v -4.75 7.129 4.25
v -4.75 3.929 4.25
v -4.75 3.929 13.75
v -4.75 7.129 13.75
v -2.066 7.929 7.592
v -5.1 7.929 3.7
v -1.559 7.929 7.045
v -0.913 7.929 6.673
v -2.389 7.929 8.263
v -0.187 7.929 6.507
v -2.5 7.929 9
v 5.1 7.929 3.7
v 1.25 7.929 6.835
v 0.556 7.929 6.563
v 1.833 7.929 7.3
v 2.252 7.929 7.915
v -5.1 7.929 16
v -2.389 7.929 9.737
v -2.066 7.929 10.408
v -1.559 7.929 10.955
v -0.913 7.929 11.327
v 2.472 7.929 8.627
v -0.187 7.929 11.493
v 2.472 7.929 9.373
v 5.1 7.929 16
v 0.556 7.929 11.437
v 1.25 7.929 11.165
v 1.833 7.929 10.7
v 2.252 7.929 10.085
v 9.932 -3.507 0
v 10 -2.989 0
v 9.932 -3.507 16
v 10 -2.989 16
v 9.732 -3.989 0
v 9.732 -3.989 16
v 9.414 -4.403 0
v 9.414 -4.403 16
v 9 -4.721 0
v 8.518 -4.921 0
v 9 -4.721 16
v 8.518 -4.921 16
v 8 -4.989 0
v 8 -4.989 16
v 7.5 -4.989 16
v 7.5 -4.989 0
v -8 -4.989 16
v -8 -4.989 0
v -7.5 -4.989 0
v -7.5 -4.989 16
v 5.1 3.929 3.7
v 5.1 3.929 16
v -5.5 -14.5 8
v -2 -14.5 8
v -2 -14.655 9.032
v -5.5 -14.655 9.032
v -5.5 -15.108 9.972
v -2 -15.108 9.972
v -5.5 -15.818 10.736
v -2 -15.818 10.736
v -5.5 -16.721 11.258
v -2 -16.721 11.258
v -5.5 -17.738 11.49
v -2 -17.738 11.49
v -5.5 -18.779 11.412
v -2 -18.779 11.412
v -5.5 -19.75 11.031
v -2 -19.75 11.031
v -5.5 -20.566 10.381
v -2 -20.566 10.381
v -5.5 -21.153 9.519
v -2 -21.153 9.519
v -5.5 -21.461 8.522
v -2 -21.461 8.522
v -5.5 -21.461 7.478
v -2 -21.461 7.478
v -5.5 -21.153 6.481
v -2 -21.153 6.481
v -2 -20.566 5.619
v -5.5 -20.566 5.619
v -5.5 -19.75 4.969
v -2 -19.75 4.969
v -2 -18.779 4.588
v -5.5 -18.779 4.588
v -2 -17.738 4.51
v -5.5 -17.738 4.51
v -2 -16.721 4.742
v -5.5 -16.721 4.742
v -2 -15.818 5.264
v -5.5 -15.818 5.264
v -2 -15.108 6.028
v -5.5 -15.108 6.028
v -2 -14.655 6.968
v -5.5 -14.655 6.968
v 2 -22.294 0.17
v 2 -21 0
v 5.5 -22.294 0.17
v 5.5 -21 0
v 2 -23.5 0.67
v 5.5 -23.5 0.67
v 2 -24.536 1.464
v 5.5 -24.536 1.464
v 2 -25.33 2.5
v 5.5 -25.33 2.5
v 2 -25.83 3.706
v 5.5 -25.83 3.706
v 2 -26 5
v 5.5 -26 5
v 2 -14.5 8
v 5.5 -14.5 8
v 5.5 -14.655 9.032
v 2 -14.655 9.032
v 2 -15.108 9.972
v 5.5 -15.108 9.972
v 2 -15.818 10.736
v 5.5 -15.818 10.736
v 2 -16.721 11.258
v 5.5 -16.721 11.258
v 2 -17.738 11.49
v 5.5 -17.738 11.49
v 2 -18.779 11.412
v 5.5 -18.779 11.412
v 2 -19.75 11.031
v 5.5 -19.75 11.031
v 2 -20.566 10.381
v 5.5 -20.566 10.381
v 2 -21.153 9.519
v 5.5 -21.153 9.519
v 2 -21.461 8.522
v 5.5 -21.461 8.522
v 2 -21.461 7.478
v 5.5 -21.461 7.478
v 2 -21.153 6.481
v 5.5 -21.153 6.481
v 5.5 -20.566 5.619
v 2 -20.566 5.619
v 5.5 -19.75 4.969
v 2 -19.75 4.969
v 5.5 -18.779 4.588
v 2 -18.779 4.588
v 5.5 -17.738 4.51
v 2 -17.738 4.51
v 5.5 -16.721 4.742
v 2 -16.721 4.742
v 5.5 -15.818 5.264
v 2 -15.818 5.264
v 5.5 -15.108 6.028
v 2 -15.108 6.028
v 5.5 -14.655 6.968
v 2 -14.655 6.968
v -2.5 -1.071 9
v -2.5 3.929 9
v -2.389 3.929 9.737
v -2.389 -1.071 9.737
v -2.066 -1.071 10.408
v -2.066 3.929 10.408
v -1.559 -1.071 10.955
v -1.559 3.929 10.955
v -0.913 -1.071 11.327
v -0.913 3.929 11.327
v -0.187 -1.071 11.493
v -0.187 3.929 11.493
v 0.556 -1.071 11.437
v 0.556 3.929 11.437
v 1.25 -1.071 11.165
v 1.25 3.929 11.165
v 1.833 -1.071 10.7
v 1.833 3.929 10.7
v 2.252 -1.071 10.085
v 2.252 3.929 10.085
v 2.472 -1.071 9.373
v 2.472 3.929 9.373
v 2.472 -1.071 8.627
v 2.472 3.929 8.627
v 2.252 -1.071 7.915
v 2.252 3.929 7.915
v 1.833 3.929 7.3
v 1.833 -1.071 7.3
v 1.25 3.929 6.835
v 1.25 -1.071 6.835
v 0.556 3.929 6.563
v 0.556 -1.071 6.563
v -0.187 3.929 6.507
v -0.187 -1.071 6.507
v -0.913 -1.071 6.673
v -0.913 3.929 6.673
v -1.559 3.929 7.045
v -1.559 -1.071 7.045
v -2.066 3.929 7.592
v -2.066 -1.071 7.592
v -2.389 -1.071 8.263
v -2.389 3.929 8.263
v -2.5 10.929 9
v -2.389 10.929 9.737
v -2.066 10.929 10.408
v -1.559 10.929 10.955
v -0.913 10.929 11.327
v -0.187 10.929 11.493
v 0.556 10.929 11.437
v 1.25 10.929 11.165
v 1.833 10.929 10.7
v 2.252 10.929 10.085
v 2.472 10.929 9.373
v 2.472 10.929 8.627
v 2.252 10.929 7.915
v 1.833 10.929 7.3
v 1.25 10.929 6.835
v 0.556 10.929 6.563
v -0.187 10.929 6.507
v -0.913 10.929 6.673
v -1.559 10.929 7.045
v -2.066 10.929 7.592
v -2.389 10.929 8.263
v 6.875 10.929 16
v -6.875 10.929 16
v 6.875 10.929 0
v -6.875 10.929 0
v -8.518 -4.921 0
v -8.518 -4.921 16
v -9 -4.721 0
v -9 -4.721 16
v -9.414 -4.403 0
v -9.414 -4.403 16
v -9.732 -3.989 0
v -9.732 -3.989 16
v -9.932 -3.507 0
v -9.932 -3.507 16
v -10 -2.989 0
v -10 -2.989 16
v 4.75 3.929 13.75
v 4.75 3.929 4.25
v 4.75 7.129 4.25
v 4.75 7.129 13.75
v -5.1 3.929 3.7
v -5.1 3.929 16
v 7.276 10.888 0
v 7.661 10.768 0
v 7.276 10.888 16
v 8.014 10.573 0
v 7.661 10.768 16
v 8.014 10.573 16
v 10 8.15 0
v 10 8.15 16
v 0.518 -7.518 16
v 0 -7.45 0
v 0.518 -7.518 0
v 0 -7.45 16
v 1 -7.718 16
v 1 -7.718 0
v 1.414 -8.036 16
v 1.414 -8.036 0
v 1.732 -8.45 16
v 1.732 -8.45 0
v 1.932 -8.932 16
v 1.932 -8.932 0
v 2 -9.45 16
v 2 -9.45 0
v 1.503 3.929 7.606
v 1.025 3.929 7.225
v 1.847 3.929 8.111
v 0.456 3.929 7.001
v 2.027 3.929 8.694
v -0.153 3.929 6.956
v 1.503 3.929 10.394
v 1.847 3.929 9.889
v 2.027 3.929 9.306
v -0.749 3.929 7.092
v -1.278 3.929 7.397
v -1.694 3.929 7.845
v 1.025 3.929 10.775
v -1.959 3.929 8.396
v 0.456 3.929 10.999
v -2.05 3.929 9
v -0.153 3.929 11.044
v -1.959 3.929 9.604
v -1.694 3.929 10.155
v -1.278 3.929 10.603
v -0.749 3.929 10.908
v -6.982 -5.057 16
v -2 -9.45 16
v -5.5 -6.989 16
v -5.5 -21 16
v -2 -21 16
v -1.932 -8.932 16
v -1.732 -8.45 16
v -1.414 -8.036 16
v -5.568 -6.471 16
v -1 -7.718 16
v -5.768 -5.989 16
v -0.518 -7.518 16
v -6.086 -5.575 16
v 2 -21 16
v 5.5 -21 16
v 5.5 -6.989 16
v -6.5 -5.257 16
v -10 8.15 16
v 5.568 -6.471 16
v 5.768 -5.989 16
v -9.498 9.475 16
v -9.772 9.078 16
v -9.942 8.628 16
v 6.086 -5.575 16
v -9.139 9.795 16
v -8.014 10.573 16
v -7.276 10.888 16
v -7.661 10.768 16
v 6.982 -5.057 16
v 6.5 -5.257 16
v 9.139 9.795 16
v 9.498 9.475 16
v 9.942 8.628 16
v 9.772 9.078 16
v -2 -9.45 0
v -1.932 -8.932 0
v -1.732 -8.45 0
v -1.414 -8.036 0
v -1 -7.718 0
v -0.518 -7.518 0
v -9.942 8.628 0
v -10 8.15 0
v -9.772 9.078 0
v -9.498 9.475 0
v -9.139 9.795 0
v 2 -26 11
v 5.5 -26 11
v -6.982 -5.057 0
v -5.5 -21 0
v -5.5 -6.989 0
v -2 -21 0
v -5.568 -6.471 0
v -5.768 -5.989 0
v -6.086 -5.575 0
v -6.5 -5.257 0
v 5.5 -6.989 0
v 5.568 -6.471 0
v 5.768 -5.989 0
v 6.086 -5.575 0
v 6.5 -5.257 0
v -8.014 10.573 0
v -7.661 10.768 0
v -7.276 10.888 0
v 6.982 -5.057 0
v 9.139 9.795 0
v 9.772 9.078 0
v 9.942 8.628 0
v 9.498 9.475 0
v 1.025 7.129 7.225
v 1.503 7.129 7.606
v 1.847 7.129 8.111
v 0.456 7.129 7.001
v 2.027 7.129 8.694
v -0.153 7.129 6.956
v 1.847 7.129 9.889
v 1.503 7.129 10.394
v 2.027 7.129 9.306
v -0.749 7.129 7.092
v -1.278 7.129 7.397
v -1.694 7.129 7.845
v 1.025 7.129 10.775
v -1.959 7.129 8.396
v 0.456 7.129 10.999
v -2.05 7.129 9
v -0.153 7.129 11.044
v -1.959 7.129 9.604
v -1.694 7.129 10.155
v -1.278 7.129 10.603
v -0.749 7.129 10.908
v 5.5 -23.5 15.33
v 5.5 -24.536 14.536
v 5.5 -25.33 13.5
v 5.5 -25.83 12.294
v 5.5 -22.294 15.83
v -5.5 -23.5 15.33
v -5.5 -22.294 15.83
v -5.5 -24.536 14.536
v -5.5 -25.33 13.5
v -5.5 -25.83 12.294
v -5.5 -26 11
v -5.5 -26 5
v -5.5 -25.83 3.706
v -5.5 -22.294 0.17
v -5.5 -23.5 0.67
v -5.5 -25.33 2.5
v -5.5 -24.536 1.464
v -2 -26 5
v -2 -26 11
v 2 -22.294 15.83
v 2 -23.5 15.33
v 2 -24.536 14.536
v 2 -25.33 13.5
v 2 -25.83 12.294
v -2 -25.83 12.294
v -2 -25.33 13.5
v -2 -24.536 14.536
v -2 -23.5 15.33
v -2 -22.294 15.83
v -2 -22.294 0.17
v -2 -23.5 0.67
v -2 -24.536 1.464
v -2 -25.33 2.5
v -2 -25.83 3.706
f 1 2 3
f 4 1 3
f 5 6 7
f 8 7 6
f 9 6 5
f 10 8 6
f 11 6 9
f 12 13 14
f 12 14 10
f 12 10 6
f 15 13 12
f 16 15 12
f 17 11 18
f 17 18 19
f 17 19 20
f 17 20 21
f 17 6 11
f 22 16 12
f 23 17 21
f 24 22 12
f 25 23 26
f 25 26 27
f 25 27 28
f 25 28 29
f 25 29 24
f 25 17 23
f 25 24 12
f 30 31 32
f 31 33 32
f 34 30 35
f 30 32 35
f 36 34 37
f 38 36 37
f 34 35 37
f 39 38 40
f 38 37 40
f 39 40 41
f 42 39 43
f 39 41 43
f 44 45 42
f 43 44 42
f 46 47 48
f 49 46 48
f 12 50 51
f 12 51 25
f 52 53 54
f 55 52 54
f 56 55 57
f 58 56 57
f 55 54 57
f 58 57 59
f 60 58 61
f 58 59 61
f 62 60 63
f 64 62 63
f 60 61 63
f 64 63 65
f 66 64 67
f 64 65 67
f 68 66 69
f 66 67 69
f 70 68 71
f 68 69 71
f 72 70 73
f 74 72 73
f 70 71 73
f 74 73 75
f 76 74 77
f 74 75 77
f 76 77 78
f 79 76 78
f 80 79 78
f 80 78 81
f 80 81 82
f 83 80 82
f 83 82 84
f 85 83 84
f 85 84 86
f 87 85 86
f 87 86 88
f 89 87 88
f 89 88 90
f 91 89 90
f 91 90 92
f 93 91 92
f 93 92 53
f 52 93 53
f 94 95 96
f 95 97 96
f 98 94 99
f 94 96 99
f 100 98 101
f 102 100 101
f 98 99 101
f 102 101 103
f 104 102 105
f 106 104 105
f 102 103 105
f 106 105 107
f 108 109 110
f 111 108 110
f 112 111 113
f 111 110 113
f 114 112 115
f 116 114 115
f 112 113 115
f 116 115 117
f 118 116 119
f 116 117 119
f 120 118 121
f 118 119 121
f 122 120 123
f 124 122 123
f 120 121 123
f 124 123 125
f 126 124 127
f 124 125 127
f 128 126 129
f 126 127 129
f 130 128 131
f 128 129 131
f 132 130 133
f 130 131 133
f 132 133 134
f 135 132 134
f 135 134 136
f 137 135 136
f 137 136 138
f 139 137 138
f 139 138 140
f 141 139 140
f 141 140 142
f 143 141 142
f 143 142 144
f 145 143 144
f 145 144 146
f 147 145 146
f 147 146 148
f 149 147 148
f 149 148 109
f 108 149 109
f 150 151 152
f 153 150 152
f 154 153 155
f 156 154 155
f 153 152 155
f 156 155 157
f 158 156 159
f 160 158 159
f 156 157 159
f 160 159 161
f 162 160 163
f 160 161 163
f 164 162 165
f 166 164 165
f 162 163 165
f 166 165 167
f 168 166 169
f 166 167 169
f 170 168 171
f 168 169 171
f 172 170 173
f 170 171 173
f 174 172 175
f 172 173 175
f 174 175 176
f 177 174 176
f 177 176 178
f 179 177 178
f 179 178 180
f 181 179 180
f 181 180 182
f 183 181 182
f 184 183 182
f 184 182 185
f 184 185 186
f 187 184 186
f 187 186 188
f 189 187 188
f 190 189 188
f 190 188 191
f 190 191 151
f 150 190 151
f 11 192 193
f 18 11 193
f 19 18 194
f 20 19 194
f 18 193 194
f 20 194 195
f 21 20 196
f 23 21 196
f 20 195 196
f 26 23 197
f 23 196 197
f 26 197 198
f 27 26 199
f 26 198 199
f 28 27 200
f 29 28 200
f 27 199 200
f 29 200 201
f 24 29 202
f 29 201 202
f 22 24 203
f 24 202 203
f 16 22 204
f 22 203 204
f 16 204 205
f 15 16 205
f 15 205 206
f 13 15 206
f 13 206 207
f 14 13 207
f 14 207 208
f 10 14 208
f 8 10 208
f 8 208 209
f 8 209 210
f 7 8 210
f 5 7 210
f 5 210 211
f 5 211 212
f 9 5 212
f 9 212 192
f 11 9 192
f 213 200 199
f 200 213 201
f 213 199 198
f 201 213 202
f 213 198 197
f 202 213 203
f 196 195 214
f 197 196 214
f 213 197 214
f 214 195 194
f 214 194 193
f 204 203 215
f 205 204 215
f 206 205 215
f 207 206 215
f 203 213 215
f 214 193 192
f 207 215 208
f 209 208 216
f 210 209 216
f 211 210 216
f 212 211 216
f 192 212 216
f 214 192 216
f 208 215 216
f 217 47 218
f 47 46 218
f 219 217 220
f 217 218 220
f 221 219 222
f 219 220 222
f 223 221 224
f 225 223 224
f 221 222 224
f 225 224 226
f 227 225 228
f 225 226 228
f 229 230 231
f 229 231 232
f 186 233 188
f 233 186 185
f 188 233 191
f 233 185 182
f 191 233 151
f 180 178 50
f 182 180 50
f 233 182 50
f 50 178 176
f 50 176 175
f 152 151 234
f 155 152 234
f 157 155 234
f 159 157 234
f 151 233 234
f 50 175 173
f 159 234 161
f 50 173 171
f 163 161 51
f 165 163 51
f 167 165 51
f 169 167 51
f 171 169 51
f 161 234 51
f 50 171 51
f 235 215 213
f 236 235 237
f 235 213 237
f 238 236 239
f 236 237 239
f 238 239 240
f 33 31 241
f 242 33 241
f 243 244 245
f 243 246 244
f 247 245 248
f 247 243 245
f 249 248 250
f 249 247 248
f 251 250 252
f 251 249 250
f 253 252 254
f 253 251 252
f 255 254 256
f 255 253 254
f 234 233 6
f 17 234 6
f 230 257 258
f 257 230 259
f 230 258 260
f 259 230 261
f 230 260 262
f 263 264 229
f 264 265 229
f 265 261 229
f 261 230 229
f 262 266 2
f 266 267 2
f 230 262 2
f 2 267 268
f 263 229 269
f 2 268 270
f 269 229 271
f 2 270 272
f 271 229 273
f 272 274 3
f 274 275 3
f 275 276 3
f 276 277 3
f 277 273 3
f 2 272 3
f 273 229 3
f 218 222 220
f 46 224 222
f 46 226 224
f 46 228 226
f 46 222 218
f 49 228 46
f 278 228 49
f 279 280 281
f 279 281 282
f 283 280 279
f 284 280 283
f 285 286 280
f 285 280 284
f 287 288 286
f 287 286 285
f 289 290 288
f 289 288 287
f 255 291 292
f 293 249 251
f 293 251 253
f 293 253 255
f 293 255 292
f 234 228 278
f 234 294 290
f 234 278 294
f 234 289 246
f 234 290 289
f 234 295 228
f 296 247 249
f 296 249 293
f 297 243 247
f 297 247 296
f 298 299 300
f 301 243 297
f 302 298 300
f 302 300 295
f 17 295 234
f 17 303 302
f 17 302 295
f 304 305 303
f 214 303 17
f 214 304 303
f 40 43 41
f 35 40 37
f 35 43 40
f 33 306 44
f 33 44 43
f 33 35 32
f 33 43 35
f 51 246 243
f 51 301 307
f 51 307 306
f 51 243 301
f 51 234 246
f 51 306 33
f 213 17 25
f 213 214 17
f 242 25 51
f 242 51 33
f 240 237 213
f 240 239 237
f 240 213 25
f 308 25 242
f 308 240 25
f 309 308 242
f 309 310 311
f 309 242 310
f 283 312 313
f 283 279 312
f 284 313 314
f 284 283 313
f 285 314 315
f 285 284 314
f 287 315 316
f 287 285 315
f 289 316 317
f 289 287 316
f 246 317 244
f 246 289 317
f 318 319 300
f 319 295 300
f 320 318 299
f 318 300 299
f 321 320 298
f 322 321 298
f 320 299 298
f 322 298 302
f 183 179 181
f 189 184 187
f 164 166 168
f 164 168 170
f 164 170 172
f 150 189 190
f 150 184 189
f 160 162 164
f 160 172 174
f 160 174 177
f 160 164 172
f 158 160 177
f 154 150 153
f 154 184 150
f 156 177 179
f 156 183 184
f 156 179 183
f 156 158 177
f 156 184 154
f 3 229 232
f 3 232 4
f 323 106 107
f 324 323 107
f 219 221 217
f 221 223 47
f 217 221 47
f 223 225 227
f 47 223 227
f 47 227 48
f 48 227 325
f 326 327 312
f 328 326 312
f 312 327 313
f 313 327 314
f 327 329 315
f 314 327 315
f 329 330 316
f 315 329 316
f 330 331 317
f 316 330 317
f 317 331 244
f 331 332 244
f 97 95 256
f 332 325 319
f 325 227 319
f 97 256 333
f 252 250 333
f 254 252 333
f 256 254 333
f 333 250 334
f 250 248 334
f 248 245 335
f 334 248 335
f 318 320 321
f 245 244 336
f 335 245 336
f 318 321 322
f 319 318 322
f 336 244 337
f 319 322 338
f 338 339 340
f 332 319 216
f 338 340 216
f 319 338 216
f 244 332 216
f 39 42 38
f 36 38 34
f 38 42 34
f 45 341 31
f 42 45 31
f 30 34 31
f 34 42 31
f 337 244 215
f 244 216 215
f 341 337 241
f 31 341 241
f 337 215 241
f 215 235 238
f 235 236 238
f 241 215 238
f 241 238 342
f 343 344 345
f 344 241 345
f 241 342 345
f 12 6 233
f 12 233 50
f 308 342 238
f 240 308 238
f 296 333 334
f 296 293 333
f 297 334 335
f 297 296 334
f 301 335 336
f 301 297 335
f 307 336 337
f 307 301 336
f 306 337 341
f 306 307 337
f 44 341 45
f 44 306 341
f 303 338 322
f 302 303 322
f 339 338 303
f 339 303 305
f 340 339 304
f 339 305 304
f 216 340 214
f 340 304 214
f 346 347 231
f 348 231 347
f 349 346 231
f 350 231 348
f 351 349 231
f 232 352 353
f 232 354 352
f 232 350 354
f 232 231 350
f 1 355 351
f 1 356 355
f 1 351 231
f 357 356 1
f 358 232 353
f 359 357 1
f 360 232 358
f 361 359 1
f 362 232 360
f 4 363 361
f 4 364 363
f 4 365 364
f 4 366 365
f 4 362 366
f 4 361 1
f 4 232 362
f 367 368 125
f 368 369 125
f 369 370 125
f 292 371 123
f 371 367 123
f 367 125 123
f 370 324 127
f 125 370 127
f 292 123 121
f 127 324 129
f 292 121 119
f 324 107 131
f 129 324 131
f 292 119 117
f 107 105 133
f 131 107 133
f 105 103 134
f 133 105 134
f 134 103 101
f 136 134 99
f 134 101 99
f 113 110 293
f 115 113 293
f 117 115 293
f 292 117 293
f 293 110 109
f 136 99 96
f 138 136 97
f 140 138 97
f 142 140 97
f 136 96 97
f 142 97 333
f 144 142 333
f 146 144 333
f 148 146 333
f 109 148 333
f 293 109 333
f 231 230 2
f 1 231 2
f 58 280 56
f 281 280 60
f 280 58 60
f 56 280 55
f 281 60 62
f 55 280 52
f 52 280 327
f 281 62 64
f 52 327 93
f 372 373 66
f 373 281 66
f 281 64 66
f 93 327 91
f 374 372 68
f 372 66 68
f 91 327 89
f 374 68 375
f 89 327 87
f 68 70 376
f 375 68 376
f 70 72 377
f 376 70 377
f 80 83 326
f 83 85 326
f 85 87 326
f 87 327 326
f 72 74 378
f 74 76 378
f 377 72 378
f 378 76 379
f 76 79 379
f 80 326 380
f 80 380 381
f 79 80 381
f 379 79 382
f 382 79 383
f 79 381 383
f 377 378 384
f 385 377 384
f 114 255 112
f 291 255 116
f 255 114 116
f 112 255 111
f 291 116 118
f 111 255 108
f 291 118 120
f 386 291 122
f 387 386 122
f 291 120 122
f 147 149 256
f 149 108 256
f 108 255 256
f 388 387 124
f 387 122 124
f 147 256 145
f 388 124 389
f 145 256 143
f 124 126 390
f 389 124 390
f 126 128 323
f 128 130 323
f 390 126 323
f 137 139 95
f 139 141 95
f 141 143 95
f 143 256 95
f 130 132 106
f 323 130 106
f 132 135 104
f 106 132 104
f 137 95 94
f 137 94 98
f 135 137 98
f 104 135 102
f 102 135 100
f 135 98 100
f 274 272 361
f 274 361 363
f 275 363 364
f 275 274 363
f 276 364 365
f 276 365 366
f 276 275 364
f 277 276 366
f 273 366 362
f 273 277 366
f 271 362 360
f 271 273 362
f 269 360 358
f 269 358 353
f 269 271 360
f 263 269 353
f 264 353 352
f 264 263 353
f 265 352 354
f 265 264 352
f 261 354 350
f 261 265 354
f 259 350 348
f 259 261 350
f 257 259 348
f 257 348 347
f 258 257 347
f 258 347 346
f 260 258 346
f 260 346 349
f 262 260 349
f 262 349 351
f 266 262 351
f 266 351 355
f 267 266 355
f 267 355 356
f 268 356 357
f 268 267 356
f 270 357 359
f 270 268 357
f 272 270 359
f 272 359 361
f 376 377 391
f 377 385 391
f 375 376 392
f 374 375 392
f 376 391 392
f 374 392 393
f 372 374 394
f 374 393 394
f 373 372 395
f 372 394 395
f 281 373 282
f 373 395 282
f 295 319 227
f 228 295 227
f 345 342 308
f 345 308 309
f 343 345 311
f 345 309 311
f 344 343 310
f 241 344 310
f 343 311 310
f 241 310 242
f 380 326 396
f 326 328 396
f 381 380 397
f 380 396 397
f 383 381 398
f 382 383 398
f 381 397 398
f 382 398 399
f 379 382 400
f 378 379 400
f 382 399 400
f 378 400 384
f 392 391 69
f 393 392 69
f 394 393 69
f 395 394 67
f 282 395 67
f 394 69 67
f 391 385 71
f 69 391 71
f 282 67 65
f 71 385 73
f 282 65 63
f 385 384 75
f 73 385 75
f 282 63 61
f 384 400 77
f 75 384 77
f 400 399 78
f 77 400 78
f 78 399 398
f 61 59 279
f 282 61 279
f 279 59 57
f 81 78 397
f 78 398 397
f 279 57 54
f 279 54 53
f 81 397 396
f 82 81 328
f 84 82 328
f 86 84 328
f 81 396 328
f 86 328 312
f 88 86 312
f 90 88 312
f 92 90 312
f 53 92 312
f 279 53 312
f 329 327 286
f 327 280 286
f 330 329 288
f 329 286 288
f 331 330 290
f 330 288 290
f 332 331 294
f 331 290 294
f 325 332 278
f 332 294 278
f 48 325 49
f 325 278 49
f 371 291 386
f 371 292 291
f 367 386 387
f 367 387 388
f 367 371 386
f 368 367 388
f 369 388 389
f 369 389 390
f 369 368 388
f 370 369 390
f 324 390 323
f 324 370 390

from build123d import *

# Parameters (mm, degrees)
F1_DEPTH  = 16
F2_R      = 2.5
F3_DEPTH  = 12
F4_R      = 3.5
F5_DEPTH  = 11
F6_R      = 1.99999
F7_W      = 10.2
F7_H      = 4
F8_DEPTH  = 12.3
F9_R      = 5
F10_W     = 9.5
F10_H     = 9.5
F10_R     = 2.05
F11_DEPTH = 3.2
F12_R     = 2


# Not quite as in the source:
# - a fillet or chamfer is up to 0.001 mm smaller than in the source, because OpenCascade refuses the exact size


with BuildPart() as f1:
    # F0 (on Top) → F1 (new body)
    with BuildSketch(Plane.XY):
        Polygon((-5.5, -4.9891225062), (-5.5, -26), (-2, -26), (-2, -7.4497503303), (2, -7.4497503303), (2, -26), (5.5, -26), (5.5, -4.9891225062), (10, -4.9891225062), (10, 9.1980283093), (7.5, 10.9290892892), (-7.5, 10.9290892892), (-10, 9.1980283093), (-10, -4.9891225062), align=None)
    extrude(amount=F1_DEPTH)

    # F2 (on face) → F3 (cut)
    with BuildSketch(Plane(origin=(0, 10.9290892892, 0), x_dir=(-1, 0, 0), z_dir=(0, 1, 0))):
        with Locations((0, 9)):
            Circle(F2_R)
    extrude(amount=-F3_DEPTH, mode=Mode.SUBTRACT)

    # F4 (on face) → F5 (cut, through all)
    with BuildSketch(Plane.YZ.offset(5.5)):
        with Locations((-18, 8)):
            Circle(F4_R)
    extrude(amount=-F5_DEPTH, mode=Mode.SUBTRACT)

    # F6 (radius 2 in the source; OpenCascade refuses exactly that, so slightly less here)
    f6_edges = [f1.edges().sort_by_distance(p)[0] for p in [
        (-5.5, -4.989123, 8),
        (2, -7.44975, 8),
        (-2, -7.44975, 8),
        (5.5, -4.989123, 8),
    ]]
    fillet(f6_edges, radius=F6_R)

    # F7 (on face) → F8 (cut)
    with BuildSketch(Plane.XY.offset(16)):
        with Locations((0, 5.9290892892)):
            Rectangle(F7_W, F7_H)
    extrude(amount=-F8_DEPTH, mode=Mode.SUBTRACT)

    # F9
    f9_edges = [f1.edges().sort_by_distance(p)[0] for p in [
        (3.75, -26, 16),
        (3.75, -26, 0),
        (-3.75, -26, 16),
        (-3.75, -26, 0),
    ]]
    fillet(f9_edges, radius=F9_R)

    # F12
    f12_edges = [f1.edges().sort_by_distance(p)[0] for p in [
        (-10, -4.989123, 8),
        (10, -4.989123, 8),
        (-10, 9.198028, 8),
        (-7.5, 10.929089, 8),
        (7.5, 10.929089, 8),
        (10, 9.198028, 8),
    ]]
    fillet(f12_edges, radius=F12_R)


with BuildPart() as f11:
    # F10 (on face) → F11 (new body)
    with BuildSketch(Plane(origin=(0, 3.9290892892, 0), x_dir=(-1, 0, 0), z_dir=(0, 1, 0))):
        with Locations((0, 9)):
            Rectangle(F10_W, F10_H)
        with Locations((0, 9)):
            Circle(F10_R, mode=Mode.SUBTRACT)
    extrude(amount=F11_DEPTH)


solid = Compound([f1.part, f11.part])
